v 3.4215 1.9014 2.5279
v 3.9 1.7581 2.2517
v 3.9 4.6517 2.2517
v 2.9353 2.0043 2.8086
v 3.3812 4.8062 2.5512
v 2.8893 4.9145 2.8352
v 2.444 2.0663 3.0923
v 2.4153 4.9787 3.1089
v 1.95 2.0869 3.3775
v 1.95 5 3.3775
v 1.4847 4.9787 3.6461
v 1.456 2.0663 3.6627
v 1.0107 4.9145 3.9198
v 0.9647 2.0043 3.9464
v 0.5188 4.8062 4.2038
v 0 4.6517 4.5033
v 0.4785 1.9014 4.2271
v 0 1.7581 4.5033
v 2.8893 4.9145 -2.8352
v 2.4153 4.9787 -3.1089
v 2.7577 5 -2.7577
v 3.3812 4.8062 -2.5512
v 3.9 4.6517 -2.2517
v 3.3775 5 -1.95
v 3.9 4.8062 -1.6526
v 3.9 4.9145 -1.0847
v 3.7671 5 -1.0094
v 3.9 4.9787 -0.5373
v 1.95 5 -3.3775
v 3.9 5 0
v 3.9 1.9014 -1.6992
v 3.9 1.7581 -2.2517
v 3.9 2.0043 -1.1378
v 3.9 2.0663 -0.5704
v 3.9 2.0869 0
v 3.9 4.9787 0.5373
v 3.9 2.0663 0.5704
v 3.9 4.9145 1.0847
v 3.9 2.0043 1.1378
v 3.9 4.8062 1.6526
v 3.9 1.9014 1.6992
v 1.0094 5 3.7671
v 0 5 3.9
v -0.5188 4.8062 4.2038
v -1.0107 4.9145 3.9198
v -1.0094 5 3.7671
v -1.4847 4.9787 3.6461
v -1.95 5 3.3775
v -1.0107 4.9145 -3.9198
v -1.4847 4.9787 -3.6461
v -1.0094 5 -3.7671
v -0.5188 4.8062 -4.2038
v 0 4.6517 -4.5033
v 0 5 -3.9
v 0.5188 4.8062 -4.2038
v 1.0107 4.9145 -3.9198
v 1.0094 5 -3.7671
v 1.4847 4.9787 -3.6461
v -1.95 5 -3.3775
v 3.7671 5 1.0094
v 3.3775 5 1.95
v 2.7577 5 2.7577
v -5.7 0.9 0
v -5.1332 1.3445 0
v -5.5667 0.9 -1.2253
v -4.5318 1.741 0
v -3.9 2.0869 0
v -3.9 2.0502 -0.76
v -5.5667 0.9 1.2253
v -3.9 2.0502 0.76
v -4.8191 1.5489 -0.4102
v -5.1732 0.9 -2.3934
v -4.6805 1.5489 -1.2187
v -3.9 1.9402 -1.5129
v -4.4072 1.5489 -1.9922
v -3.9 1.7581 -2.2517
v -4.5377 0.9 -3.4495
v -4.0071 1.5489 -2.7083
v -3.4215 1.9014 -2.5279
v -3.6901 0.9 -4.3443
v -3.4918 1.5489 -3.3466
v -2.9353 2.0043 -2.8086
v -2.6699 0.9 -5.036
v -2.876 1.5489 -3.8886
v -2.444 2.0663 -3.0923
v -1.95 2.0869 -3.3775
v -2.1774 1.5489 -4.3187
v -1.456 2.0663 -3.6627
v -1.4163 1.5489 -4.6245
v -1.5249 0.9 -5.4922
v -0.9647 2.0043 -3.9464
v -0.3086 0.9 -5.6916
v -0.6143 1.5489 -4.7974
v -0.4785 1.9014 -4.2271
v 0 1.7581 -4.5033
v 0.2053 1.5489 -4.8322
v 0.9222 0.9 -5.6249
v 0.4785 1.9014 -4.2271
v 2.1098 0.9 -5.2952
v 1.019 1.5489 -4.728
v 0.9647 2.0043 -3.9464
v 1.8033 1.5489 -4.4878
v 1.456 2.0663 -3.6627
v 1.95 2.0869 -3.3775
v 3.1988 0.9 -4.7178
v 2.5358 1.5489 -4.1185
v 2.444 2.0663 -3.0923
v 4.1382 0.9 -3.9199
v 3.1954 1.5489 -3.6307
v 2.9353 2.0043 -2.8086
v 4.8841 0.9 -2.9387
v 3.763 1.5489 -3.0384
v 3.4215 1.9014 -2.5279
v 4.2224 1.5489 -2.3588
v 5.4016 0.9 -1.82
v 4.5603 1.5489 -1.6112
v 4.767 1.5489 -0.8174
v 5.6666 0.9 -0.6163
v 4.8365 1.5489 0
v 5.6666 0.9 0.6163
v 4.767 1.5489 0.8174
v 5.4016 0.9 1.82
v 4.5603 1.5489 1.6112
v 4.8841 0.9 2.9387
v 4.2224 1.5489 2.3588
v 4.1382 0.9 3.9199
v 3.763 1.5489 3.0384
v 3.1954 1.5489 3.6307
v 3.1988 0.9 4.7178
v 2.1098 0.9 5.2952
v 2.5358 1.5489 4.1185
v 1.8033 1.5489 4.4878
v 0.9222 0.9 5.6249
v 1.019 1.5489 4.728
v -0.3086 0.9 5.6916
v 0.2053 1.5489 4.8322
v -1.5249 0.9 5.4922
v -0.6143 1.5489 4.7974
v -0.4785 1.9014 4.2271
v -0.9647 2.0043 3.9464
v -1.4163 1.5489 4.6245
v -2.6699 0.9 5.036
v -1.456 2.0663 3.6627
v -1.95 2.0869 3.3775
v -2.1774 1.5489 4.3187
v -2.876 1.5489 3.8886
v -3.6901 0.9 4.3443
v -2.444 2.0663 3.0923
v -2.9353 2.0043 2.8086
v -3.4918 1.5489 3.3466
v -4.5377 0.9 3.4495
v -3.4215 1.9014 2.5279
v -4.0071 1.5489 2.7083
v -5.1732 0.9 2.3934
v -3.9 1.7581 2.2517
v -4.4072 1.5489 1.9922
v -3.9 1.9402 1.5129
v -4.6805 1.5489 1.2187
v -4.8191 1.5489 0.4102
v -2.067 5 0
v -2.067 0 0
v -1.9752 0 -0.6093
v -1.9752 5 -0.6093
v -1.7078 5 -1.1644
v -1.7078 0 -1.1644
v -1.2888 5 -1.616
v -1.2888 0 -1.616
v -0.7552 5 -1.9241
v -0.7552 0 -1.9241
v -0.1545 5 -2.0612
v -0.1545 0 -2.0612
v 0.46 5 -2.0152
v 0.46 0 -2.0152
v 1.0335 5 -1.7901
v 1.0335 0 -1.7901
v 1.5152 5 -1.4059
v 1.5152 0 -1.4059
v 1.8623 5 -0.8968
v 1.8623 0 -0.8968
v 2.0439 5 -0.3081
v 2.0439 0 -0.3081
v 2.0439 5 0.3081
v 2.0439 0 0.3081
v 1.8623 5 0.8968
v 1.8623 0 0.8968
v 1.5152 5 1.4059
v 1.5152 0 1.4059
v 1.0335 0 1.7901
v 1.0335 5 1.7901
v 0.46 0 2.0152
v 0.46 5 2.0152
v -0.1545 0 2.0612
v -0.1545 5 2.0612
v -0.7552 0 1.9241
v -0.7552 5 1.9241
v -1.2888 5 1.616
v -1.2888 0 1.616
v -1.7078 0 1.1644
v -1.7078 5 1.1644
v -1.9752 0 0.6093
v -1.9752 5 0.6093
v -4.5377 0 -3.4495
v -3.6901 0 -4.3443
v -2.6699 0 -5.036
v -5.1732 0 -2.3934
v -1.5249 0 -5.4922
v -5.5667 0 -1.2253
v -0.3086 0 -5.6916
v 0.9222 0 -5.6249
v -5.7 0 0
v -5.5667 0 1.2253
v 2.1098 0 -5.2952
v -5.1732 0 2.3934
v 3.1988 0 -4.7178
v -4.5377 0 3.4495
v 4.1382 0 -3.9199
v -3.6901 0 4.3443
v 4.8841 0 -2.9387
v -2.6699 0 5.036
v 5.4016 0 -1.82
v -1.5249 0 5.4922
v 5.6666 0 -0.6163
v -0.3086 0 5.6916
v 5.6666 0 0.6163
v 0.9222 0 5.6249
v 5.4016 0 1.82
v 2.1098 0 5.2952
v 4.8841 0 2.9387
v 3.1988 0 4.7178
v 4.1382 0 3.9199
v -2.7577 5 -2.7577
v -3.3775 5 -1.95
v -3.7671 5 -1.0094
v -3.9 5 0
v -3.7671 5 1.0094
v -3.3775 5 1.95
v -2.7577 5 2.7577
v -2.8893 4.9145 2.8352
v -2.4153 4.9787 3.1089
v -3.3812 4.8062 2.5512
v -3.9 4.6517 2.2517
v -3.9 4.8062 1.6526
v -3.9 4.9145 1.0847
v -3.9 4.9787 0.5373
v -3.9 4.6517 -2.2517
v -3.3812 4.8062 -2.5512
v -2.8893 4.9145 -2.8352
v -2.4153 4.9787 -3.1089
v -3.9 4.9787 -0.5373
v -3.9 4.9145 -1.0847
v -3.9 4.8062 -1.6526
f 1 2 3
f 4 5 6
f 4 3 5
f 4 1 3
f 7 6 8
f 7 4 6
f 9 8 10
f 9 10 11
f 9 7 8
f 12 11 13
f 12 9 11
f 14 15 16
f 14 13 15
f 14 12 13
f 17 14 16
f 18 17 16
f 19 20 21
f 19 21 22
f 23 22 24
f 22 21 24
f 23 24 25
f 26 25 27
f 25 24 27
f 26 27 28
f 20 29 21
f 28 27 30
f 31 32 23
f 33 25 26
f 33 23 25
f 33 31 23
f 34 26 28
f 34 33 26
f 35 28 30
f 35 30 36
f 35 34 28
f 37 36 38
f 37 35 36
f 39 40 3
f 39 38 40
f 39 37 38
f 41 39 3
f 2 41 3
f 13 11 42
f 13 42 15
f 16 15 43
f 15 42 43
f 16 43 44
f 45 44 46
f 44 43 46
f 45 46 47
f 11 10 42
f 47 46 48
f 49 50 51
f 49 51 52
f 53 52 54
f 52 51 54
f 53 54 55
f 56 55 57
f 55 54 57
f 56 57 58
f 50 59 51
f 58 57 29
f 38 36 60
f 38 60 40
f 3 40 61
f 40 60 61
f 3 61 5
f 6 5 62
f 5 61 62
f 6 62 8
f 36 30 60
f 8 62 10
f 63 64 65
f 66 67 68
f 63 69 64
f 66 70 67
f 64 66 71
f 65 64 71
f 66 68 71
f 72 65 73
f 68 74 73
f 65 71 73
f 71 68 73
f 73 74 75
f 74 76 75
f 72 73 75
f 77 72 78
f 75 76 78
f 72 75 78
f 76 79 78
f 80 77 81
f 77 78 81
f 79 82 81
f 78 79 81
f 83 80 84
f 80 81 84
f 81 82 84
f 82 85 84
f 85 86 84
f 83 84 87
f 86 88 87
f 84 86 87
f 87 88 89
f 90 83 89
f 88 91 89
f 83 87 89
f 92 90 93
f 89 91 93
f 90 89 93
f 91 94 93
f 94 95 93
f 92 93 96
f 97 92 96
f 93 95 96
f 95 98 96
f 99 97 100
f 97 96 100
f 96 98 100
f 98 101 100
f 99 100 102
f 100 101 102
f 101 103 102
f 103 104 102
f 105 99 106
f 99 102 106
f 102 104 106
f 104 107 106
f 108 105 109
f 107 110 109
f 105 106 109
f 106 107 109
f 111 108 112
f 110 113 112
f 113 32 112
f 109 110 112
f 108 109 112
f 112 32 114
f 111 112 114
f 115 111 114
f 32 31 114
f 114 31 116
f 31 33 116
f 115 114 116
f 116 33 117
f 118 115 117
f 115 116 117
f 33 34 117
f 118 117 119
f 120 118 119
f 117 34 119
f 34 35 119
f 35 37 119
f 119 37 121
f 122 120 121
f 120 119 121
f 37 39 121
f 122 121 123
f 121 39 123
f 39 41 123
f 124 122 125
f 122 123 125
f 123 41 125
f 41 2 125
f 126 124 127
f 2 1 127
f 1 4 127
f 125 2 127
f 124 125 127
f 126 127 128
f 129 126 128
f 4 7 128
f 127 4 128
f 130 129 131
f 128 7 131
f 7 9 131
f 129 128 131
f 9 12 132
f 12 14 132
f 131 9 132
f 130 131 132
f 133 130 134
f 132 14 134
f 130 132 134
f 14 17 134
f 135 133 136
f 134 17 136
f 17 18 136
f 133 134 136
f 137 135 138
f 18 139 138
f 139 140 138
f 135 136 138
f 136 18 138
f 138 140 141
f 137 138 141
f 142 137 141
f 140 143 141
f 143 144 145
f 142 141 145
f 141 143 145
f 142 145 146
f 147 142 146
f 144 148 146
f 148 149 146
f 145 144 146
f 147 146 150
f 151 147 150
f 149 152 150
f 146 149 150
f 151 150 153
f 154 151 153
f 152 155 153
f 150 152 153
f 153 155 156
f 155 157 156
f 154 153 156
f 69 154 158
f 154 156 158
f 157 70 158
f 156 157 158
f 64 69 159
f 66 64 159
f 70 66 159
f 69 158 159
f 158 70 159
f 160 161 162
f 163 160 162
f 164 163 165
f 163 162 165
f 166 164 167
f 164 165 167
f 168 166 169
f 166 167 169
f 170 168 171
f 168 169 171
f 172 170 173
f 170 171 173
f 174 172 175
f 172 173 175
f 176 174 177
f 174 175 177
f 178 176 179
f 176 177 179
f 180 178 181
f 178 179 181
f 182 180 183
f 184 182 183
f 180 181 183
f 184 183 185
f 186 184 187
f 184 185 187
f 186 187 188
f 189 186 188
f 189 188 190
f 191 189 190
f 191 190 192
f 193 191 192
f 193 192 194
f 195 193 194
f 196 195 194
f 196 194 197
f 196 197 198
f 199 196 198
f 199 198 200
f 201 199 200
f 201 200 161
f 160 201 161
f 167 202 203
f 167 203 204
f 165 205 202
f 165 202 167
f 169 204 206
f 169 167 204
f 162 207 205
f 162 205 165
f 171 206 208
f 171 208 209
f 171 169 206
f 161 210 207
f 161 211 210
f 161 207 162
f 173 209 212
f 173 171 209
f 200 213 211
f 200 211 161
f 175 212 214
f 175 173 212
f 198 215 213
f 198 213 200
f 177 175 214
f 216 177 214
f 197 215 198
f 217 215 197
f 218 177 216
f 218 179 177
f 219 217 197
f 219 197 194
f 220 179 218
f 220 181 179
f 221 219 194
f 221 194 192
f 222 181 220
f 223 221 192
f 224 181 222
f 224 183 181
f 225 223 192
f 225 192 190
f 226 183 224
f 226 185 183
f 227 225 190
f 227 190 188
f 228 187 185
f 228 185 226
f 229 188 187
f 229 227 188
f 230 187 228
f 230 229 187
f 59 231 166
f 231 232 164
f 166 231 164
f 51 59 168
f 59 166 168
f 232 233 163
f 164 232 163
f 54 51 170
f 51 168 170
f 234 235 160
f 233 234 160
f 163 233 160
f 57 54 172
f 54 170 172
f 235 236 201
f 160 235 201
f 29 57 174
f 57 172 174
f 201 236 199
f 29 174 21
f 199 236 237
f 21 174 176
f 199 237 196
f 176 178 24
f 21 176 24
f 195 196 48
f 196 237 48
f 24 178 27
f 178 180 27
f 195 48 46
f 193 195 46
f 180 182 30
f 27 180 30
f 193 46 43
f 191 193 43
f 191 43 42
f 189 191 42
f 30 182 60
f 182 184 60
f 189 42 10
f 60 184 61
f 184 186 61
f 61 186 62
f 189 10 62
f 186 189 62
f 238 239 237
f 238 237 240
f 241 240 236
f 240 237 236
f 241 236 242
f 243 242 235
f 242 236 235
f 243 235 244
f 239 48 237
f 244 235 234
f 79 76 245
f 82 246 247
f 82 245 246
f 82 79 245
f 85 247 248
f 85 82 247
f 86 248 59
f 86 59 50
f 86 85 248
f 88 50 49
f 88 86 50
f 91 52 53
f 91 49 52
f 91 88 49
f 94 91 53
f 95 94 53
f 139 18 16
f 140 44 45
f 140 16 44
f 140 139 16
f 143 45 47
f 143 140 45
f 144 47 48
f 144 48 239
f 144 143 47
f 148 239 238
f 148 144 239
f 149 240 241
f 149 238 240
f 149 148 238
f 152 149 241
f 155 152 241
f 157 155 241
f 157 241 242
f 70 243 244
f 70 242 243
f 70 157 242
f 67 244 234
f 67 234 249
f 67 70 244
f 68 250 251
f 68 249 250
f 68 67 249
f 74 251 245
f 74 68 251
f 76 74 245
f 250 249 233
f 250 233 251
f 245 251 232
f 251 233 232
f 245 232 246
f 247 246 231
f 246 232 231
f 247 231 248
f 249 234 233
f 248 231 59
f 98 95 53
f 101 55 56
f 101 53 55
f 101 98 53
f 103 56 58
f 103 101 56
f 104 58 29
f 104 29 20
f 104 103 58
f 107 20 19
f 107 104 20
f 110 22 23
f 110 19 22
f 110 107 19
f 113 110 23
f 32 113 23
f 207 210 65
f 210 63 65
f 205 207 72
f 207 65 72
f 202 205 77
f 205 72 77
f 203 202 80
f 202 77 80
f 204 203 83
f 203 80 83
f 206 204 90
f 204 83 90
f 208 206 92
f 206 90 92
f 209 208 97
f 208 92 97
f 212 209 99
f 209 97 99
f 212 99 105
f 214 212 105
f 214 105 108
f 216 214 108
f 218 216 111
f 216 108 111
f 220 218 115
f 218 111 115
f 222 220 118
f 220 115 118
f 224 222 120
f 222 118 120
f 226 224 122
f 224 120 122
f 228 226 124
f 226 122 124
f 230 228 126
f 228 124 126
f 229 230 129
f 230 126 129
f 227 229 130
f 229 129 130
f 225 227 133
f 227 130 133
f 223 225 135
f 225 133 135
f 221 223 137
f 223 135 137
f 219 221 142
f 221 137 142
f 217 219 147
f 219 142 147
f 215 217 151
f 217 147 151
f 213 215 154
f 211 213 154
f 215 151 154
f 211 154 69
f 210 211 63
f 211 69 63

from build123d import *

# Parameters (mm, degrees)
BOSS_EXTRUDE1_DEPTH = 5
TAP1_D              = 4.134


with BuildPart() as part:
    # Sketch1 → Revolve1 (revolve)
    with BuildSketch(Plane.XY):
        with BuildLine():
            Line((0, 0), (-5.7, 0))
            Line((-5.7, 0), (-5.7, 0.9))
            ThreePointArc((-5.7, 0.9), (-3.03726851, 2.458300241), (0, 3))
            Line((0, 3), (0, 0))
        make_face()
    revolve(axis=Axis((0, 55, 0), (0, -1, 0)))

    # Sketch2 → Boss-Extrude1 (add)
    with BuildSketch(Plane.XZ):
        Polygon((0, 4.5033321), (-3.9, 2.25166605), (-3.9, -2.25166605), (0, -4.5033321), (3.9, -2.25166605), (3.9, 2.25166605), align=None)
    extrude(amount=-BOSS_EXTRUDE1_DEPTH)

    # Sketch3 → Cut-Revolve1 (revolve, cut)
    with BuildSketch(Plane.XY):
        Polygon((-3.9, 5), (-5.9, 5), (-5.9, 3.845299462), align=None)
    revolve(axis=Axis((0, 55, 0), (0, -1, 0)), mode=Mode.SUBTRACT)

    # Tap1 (through all)
    with Locations(Plane(origin=(0, 5, 0), x_dir=(1, 0, 0), z_dir=(0, 1, 0))):
        with Locations((0, 0)):
            Hole(TAP1_D / 2)


solid = part.part
